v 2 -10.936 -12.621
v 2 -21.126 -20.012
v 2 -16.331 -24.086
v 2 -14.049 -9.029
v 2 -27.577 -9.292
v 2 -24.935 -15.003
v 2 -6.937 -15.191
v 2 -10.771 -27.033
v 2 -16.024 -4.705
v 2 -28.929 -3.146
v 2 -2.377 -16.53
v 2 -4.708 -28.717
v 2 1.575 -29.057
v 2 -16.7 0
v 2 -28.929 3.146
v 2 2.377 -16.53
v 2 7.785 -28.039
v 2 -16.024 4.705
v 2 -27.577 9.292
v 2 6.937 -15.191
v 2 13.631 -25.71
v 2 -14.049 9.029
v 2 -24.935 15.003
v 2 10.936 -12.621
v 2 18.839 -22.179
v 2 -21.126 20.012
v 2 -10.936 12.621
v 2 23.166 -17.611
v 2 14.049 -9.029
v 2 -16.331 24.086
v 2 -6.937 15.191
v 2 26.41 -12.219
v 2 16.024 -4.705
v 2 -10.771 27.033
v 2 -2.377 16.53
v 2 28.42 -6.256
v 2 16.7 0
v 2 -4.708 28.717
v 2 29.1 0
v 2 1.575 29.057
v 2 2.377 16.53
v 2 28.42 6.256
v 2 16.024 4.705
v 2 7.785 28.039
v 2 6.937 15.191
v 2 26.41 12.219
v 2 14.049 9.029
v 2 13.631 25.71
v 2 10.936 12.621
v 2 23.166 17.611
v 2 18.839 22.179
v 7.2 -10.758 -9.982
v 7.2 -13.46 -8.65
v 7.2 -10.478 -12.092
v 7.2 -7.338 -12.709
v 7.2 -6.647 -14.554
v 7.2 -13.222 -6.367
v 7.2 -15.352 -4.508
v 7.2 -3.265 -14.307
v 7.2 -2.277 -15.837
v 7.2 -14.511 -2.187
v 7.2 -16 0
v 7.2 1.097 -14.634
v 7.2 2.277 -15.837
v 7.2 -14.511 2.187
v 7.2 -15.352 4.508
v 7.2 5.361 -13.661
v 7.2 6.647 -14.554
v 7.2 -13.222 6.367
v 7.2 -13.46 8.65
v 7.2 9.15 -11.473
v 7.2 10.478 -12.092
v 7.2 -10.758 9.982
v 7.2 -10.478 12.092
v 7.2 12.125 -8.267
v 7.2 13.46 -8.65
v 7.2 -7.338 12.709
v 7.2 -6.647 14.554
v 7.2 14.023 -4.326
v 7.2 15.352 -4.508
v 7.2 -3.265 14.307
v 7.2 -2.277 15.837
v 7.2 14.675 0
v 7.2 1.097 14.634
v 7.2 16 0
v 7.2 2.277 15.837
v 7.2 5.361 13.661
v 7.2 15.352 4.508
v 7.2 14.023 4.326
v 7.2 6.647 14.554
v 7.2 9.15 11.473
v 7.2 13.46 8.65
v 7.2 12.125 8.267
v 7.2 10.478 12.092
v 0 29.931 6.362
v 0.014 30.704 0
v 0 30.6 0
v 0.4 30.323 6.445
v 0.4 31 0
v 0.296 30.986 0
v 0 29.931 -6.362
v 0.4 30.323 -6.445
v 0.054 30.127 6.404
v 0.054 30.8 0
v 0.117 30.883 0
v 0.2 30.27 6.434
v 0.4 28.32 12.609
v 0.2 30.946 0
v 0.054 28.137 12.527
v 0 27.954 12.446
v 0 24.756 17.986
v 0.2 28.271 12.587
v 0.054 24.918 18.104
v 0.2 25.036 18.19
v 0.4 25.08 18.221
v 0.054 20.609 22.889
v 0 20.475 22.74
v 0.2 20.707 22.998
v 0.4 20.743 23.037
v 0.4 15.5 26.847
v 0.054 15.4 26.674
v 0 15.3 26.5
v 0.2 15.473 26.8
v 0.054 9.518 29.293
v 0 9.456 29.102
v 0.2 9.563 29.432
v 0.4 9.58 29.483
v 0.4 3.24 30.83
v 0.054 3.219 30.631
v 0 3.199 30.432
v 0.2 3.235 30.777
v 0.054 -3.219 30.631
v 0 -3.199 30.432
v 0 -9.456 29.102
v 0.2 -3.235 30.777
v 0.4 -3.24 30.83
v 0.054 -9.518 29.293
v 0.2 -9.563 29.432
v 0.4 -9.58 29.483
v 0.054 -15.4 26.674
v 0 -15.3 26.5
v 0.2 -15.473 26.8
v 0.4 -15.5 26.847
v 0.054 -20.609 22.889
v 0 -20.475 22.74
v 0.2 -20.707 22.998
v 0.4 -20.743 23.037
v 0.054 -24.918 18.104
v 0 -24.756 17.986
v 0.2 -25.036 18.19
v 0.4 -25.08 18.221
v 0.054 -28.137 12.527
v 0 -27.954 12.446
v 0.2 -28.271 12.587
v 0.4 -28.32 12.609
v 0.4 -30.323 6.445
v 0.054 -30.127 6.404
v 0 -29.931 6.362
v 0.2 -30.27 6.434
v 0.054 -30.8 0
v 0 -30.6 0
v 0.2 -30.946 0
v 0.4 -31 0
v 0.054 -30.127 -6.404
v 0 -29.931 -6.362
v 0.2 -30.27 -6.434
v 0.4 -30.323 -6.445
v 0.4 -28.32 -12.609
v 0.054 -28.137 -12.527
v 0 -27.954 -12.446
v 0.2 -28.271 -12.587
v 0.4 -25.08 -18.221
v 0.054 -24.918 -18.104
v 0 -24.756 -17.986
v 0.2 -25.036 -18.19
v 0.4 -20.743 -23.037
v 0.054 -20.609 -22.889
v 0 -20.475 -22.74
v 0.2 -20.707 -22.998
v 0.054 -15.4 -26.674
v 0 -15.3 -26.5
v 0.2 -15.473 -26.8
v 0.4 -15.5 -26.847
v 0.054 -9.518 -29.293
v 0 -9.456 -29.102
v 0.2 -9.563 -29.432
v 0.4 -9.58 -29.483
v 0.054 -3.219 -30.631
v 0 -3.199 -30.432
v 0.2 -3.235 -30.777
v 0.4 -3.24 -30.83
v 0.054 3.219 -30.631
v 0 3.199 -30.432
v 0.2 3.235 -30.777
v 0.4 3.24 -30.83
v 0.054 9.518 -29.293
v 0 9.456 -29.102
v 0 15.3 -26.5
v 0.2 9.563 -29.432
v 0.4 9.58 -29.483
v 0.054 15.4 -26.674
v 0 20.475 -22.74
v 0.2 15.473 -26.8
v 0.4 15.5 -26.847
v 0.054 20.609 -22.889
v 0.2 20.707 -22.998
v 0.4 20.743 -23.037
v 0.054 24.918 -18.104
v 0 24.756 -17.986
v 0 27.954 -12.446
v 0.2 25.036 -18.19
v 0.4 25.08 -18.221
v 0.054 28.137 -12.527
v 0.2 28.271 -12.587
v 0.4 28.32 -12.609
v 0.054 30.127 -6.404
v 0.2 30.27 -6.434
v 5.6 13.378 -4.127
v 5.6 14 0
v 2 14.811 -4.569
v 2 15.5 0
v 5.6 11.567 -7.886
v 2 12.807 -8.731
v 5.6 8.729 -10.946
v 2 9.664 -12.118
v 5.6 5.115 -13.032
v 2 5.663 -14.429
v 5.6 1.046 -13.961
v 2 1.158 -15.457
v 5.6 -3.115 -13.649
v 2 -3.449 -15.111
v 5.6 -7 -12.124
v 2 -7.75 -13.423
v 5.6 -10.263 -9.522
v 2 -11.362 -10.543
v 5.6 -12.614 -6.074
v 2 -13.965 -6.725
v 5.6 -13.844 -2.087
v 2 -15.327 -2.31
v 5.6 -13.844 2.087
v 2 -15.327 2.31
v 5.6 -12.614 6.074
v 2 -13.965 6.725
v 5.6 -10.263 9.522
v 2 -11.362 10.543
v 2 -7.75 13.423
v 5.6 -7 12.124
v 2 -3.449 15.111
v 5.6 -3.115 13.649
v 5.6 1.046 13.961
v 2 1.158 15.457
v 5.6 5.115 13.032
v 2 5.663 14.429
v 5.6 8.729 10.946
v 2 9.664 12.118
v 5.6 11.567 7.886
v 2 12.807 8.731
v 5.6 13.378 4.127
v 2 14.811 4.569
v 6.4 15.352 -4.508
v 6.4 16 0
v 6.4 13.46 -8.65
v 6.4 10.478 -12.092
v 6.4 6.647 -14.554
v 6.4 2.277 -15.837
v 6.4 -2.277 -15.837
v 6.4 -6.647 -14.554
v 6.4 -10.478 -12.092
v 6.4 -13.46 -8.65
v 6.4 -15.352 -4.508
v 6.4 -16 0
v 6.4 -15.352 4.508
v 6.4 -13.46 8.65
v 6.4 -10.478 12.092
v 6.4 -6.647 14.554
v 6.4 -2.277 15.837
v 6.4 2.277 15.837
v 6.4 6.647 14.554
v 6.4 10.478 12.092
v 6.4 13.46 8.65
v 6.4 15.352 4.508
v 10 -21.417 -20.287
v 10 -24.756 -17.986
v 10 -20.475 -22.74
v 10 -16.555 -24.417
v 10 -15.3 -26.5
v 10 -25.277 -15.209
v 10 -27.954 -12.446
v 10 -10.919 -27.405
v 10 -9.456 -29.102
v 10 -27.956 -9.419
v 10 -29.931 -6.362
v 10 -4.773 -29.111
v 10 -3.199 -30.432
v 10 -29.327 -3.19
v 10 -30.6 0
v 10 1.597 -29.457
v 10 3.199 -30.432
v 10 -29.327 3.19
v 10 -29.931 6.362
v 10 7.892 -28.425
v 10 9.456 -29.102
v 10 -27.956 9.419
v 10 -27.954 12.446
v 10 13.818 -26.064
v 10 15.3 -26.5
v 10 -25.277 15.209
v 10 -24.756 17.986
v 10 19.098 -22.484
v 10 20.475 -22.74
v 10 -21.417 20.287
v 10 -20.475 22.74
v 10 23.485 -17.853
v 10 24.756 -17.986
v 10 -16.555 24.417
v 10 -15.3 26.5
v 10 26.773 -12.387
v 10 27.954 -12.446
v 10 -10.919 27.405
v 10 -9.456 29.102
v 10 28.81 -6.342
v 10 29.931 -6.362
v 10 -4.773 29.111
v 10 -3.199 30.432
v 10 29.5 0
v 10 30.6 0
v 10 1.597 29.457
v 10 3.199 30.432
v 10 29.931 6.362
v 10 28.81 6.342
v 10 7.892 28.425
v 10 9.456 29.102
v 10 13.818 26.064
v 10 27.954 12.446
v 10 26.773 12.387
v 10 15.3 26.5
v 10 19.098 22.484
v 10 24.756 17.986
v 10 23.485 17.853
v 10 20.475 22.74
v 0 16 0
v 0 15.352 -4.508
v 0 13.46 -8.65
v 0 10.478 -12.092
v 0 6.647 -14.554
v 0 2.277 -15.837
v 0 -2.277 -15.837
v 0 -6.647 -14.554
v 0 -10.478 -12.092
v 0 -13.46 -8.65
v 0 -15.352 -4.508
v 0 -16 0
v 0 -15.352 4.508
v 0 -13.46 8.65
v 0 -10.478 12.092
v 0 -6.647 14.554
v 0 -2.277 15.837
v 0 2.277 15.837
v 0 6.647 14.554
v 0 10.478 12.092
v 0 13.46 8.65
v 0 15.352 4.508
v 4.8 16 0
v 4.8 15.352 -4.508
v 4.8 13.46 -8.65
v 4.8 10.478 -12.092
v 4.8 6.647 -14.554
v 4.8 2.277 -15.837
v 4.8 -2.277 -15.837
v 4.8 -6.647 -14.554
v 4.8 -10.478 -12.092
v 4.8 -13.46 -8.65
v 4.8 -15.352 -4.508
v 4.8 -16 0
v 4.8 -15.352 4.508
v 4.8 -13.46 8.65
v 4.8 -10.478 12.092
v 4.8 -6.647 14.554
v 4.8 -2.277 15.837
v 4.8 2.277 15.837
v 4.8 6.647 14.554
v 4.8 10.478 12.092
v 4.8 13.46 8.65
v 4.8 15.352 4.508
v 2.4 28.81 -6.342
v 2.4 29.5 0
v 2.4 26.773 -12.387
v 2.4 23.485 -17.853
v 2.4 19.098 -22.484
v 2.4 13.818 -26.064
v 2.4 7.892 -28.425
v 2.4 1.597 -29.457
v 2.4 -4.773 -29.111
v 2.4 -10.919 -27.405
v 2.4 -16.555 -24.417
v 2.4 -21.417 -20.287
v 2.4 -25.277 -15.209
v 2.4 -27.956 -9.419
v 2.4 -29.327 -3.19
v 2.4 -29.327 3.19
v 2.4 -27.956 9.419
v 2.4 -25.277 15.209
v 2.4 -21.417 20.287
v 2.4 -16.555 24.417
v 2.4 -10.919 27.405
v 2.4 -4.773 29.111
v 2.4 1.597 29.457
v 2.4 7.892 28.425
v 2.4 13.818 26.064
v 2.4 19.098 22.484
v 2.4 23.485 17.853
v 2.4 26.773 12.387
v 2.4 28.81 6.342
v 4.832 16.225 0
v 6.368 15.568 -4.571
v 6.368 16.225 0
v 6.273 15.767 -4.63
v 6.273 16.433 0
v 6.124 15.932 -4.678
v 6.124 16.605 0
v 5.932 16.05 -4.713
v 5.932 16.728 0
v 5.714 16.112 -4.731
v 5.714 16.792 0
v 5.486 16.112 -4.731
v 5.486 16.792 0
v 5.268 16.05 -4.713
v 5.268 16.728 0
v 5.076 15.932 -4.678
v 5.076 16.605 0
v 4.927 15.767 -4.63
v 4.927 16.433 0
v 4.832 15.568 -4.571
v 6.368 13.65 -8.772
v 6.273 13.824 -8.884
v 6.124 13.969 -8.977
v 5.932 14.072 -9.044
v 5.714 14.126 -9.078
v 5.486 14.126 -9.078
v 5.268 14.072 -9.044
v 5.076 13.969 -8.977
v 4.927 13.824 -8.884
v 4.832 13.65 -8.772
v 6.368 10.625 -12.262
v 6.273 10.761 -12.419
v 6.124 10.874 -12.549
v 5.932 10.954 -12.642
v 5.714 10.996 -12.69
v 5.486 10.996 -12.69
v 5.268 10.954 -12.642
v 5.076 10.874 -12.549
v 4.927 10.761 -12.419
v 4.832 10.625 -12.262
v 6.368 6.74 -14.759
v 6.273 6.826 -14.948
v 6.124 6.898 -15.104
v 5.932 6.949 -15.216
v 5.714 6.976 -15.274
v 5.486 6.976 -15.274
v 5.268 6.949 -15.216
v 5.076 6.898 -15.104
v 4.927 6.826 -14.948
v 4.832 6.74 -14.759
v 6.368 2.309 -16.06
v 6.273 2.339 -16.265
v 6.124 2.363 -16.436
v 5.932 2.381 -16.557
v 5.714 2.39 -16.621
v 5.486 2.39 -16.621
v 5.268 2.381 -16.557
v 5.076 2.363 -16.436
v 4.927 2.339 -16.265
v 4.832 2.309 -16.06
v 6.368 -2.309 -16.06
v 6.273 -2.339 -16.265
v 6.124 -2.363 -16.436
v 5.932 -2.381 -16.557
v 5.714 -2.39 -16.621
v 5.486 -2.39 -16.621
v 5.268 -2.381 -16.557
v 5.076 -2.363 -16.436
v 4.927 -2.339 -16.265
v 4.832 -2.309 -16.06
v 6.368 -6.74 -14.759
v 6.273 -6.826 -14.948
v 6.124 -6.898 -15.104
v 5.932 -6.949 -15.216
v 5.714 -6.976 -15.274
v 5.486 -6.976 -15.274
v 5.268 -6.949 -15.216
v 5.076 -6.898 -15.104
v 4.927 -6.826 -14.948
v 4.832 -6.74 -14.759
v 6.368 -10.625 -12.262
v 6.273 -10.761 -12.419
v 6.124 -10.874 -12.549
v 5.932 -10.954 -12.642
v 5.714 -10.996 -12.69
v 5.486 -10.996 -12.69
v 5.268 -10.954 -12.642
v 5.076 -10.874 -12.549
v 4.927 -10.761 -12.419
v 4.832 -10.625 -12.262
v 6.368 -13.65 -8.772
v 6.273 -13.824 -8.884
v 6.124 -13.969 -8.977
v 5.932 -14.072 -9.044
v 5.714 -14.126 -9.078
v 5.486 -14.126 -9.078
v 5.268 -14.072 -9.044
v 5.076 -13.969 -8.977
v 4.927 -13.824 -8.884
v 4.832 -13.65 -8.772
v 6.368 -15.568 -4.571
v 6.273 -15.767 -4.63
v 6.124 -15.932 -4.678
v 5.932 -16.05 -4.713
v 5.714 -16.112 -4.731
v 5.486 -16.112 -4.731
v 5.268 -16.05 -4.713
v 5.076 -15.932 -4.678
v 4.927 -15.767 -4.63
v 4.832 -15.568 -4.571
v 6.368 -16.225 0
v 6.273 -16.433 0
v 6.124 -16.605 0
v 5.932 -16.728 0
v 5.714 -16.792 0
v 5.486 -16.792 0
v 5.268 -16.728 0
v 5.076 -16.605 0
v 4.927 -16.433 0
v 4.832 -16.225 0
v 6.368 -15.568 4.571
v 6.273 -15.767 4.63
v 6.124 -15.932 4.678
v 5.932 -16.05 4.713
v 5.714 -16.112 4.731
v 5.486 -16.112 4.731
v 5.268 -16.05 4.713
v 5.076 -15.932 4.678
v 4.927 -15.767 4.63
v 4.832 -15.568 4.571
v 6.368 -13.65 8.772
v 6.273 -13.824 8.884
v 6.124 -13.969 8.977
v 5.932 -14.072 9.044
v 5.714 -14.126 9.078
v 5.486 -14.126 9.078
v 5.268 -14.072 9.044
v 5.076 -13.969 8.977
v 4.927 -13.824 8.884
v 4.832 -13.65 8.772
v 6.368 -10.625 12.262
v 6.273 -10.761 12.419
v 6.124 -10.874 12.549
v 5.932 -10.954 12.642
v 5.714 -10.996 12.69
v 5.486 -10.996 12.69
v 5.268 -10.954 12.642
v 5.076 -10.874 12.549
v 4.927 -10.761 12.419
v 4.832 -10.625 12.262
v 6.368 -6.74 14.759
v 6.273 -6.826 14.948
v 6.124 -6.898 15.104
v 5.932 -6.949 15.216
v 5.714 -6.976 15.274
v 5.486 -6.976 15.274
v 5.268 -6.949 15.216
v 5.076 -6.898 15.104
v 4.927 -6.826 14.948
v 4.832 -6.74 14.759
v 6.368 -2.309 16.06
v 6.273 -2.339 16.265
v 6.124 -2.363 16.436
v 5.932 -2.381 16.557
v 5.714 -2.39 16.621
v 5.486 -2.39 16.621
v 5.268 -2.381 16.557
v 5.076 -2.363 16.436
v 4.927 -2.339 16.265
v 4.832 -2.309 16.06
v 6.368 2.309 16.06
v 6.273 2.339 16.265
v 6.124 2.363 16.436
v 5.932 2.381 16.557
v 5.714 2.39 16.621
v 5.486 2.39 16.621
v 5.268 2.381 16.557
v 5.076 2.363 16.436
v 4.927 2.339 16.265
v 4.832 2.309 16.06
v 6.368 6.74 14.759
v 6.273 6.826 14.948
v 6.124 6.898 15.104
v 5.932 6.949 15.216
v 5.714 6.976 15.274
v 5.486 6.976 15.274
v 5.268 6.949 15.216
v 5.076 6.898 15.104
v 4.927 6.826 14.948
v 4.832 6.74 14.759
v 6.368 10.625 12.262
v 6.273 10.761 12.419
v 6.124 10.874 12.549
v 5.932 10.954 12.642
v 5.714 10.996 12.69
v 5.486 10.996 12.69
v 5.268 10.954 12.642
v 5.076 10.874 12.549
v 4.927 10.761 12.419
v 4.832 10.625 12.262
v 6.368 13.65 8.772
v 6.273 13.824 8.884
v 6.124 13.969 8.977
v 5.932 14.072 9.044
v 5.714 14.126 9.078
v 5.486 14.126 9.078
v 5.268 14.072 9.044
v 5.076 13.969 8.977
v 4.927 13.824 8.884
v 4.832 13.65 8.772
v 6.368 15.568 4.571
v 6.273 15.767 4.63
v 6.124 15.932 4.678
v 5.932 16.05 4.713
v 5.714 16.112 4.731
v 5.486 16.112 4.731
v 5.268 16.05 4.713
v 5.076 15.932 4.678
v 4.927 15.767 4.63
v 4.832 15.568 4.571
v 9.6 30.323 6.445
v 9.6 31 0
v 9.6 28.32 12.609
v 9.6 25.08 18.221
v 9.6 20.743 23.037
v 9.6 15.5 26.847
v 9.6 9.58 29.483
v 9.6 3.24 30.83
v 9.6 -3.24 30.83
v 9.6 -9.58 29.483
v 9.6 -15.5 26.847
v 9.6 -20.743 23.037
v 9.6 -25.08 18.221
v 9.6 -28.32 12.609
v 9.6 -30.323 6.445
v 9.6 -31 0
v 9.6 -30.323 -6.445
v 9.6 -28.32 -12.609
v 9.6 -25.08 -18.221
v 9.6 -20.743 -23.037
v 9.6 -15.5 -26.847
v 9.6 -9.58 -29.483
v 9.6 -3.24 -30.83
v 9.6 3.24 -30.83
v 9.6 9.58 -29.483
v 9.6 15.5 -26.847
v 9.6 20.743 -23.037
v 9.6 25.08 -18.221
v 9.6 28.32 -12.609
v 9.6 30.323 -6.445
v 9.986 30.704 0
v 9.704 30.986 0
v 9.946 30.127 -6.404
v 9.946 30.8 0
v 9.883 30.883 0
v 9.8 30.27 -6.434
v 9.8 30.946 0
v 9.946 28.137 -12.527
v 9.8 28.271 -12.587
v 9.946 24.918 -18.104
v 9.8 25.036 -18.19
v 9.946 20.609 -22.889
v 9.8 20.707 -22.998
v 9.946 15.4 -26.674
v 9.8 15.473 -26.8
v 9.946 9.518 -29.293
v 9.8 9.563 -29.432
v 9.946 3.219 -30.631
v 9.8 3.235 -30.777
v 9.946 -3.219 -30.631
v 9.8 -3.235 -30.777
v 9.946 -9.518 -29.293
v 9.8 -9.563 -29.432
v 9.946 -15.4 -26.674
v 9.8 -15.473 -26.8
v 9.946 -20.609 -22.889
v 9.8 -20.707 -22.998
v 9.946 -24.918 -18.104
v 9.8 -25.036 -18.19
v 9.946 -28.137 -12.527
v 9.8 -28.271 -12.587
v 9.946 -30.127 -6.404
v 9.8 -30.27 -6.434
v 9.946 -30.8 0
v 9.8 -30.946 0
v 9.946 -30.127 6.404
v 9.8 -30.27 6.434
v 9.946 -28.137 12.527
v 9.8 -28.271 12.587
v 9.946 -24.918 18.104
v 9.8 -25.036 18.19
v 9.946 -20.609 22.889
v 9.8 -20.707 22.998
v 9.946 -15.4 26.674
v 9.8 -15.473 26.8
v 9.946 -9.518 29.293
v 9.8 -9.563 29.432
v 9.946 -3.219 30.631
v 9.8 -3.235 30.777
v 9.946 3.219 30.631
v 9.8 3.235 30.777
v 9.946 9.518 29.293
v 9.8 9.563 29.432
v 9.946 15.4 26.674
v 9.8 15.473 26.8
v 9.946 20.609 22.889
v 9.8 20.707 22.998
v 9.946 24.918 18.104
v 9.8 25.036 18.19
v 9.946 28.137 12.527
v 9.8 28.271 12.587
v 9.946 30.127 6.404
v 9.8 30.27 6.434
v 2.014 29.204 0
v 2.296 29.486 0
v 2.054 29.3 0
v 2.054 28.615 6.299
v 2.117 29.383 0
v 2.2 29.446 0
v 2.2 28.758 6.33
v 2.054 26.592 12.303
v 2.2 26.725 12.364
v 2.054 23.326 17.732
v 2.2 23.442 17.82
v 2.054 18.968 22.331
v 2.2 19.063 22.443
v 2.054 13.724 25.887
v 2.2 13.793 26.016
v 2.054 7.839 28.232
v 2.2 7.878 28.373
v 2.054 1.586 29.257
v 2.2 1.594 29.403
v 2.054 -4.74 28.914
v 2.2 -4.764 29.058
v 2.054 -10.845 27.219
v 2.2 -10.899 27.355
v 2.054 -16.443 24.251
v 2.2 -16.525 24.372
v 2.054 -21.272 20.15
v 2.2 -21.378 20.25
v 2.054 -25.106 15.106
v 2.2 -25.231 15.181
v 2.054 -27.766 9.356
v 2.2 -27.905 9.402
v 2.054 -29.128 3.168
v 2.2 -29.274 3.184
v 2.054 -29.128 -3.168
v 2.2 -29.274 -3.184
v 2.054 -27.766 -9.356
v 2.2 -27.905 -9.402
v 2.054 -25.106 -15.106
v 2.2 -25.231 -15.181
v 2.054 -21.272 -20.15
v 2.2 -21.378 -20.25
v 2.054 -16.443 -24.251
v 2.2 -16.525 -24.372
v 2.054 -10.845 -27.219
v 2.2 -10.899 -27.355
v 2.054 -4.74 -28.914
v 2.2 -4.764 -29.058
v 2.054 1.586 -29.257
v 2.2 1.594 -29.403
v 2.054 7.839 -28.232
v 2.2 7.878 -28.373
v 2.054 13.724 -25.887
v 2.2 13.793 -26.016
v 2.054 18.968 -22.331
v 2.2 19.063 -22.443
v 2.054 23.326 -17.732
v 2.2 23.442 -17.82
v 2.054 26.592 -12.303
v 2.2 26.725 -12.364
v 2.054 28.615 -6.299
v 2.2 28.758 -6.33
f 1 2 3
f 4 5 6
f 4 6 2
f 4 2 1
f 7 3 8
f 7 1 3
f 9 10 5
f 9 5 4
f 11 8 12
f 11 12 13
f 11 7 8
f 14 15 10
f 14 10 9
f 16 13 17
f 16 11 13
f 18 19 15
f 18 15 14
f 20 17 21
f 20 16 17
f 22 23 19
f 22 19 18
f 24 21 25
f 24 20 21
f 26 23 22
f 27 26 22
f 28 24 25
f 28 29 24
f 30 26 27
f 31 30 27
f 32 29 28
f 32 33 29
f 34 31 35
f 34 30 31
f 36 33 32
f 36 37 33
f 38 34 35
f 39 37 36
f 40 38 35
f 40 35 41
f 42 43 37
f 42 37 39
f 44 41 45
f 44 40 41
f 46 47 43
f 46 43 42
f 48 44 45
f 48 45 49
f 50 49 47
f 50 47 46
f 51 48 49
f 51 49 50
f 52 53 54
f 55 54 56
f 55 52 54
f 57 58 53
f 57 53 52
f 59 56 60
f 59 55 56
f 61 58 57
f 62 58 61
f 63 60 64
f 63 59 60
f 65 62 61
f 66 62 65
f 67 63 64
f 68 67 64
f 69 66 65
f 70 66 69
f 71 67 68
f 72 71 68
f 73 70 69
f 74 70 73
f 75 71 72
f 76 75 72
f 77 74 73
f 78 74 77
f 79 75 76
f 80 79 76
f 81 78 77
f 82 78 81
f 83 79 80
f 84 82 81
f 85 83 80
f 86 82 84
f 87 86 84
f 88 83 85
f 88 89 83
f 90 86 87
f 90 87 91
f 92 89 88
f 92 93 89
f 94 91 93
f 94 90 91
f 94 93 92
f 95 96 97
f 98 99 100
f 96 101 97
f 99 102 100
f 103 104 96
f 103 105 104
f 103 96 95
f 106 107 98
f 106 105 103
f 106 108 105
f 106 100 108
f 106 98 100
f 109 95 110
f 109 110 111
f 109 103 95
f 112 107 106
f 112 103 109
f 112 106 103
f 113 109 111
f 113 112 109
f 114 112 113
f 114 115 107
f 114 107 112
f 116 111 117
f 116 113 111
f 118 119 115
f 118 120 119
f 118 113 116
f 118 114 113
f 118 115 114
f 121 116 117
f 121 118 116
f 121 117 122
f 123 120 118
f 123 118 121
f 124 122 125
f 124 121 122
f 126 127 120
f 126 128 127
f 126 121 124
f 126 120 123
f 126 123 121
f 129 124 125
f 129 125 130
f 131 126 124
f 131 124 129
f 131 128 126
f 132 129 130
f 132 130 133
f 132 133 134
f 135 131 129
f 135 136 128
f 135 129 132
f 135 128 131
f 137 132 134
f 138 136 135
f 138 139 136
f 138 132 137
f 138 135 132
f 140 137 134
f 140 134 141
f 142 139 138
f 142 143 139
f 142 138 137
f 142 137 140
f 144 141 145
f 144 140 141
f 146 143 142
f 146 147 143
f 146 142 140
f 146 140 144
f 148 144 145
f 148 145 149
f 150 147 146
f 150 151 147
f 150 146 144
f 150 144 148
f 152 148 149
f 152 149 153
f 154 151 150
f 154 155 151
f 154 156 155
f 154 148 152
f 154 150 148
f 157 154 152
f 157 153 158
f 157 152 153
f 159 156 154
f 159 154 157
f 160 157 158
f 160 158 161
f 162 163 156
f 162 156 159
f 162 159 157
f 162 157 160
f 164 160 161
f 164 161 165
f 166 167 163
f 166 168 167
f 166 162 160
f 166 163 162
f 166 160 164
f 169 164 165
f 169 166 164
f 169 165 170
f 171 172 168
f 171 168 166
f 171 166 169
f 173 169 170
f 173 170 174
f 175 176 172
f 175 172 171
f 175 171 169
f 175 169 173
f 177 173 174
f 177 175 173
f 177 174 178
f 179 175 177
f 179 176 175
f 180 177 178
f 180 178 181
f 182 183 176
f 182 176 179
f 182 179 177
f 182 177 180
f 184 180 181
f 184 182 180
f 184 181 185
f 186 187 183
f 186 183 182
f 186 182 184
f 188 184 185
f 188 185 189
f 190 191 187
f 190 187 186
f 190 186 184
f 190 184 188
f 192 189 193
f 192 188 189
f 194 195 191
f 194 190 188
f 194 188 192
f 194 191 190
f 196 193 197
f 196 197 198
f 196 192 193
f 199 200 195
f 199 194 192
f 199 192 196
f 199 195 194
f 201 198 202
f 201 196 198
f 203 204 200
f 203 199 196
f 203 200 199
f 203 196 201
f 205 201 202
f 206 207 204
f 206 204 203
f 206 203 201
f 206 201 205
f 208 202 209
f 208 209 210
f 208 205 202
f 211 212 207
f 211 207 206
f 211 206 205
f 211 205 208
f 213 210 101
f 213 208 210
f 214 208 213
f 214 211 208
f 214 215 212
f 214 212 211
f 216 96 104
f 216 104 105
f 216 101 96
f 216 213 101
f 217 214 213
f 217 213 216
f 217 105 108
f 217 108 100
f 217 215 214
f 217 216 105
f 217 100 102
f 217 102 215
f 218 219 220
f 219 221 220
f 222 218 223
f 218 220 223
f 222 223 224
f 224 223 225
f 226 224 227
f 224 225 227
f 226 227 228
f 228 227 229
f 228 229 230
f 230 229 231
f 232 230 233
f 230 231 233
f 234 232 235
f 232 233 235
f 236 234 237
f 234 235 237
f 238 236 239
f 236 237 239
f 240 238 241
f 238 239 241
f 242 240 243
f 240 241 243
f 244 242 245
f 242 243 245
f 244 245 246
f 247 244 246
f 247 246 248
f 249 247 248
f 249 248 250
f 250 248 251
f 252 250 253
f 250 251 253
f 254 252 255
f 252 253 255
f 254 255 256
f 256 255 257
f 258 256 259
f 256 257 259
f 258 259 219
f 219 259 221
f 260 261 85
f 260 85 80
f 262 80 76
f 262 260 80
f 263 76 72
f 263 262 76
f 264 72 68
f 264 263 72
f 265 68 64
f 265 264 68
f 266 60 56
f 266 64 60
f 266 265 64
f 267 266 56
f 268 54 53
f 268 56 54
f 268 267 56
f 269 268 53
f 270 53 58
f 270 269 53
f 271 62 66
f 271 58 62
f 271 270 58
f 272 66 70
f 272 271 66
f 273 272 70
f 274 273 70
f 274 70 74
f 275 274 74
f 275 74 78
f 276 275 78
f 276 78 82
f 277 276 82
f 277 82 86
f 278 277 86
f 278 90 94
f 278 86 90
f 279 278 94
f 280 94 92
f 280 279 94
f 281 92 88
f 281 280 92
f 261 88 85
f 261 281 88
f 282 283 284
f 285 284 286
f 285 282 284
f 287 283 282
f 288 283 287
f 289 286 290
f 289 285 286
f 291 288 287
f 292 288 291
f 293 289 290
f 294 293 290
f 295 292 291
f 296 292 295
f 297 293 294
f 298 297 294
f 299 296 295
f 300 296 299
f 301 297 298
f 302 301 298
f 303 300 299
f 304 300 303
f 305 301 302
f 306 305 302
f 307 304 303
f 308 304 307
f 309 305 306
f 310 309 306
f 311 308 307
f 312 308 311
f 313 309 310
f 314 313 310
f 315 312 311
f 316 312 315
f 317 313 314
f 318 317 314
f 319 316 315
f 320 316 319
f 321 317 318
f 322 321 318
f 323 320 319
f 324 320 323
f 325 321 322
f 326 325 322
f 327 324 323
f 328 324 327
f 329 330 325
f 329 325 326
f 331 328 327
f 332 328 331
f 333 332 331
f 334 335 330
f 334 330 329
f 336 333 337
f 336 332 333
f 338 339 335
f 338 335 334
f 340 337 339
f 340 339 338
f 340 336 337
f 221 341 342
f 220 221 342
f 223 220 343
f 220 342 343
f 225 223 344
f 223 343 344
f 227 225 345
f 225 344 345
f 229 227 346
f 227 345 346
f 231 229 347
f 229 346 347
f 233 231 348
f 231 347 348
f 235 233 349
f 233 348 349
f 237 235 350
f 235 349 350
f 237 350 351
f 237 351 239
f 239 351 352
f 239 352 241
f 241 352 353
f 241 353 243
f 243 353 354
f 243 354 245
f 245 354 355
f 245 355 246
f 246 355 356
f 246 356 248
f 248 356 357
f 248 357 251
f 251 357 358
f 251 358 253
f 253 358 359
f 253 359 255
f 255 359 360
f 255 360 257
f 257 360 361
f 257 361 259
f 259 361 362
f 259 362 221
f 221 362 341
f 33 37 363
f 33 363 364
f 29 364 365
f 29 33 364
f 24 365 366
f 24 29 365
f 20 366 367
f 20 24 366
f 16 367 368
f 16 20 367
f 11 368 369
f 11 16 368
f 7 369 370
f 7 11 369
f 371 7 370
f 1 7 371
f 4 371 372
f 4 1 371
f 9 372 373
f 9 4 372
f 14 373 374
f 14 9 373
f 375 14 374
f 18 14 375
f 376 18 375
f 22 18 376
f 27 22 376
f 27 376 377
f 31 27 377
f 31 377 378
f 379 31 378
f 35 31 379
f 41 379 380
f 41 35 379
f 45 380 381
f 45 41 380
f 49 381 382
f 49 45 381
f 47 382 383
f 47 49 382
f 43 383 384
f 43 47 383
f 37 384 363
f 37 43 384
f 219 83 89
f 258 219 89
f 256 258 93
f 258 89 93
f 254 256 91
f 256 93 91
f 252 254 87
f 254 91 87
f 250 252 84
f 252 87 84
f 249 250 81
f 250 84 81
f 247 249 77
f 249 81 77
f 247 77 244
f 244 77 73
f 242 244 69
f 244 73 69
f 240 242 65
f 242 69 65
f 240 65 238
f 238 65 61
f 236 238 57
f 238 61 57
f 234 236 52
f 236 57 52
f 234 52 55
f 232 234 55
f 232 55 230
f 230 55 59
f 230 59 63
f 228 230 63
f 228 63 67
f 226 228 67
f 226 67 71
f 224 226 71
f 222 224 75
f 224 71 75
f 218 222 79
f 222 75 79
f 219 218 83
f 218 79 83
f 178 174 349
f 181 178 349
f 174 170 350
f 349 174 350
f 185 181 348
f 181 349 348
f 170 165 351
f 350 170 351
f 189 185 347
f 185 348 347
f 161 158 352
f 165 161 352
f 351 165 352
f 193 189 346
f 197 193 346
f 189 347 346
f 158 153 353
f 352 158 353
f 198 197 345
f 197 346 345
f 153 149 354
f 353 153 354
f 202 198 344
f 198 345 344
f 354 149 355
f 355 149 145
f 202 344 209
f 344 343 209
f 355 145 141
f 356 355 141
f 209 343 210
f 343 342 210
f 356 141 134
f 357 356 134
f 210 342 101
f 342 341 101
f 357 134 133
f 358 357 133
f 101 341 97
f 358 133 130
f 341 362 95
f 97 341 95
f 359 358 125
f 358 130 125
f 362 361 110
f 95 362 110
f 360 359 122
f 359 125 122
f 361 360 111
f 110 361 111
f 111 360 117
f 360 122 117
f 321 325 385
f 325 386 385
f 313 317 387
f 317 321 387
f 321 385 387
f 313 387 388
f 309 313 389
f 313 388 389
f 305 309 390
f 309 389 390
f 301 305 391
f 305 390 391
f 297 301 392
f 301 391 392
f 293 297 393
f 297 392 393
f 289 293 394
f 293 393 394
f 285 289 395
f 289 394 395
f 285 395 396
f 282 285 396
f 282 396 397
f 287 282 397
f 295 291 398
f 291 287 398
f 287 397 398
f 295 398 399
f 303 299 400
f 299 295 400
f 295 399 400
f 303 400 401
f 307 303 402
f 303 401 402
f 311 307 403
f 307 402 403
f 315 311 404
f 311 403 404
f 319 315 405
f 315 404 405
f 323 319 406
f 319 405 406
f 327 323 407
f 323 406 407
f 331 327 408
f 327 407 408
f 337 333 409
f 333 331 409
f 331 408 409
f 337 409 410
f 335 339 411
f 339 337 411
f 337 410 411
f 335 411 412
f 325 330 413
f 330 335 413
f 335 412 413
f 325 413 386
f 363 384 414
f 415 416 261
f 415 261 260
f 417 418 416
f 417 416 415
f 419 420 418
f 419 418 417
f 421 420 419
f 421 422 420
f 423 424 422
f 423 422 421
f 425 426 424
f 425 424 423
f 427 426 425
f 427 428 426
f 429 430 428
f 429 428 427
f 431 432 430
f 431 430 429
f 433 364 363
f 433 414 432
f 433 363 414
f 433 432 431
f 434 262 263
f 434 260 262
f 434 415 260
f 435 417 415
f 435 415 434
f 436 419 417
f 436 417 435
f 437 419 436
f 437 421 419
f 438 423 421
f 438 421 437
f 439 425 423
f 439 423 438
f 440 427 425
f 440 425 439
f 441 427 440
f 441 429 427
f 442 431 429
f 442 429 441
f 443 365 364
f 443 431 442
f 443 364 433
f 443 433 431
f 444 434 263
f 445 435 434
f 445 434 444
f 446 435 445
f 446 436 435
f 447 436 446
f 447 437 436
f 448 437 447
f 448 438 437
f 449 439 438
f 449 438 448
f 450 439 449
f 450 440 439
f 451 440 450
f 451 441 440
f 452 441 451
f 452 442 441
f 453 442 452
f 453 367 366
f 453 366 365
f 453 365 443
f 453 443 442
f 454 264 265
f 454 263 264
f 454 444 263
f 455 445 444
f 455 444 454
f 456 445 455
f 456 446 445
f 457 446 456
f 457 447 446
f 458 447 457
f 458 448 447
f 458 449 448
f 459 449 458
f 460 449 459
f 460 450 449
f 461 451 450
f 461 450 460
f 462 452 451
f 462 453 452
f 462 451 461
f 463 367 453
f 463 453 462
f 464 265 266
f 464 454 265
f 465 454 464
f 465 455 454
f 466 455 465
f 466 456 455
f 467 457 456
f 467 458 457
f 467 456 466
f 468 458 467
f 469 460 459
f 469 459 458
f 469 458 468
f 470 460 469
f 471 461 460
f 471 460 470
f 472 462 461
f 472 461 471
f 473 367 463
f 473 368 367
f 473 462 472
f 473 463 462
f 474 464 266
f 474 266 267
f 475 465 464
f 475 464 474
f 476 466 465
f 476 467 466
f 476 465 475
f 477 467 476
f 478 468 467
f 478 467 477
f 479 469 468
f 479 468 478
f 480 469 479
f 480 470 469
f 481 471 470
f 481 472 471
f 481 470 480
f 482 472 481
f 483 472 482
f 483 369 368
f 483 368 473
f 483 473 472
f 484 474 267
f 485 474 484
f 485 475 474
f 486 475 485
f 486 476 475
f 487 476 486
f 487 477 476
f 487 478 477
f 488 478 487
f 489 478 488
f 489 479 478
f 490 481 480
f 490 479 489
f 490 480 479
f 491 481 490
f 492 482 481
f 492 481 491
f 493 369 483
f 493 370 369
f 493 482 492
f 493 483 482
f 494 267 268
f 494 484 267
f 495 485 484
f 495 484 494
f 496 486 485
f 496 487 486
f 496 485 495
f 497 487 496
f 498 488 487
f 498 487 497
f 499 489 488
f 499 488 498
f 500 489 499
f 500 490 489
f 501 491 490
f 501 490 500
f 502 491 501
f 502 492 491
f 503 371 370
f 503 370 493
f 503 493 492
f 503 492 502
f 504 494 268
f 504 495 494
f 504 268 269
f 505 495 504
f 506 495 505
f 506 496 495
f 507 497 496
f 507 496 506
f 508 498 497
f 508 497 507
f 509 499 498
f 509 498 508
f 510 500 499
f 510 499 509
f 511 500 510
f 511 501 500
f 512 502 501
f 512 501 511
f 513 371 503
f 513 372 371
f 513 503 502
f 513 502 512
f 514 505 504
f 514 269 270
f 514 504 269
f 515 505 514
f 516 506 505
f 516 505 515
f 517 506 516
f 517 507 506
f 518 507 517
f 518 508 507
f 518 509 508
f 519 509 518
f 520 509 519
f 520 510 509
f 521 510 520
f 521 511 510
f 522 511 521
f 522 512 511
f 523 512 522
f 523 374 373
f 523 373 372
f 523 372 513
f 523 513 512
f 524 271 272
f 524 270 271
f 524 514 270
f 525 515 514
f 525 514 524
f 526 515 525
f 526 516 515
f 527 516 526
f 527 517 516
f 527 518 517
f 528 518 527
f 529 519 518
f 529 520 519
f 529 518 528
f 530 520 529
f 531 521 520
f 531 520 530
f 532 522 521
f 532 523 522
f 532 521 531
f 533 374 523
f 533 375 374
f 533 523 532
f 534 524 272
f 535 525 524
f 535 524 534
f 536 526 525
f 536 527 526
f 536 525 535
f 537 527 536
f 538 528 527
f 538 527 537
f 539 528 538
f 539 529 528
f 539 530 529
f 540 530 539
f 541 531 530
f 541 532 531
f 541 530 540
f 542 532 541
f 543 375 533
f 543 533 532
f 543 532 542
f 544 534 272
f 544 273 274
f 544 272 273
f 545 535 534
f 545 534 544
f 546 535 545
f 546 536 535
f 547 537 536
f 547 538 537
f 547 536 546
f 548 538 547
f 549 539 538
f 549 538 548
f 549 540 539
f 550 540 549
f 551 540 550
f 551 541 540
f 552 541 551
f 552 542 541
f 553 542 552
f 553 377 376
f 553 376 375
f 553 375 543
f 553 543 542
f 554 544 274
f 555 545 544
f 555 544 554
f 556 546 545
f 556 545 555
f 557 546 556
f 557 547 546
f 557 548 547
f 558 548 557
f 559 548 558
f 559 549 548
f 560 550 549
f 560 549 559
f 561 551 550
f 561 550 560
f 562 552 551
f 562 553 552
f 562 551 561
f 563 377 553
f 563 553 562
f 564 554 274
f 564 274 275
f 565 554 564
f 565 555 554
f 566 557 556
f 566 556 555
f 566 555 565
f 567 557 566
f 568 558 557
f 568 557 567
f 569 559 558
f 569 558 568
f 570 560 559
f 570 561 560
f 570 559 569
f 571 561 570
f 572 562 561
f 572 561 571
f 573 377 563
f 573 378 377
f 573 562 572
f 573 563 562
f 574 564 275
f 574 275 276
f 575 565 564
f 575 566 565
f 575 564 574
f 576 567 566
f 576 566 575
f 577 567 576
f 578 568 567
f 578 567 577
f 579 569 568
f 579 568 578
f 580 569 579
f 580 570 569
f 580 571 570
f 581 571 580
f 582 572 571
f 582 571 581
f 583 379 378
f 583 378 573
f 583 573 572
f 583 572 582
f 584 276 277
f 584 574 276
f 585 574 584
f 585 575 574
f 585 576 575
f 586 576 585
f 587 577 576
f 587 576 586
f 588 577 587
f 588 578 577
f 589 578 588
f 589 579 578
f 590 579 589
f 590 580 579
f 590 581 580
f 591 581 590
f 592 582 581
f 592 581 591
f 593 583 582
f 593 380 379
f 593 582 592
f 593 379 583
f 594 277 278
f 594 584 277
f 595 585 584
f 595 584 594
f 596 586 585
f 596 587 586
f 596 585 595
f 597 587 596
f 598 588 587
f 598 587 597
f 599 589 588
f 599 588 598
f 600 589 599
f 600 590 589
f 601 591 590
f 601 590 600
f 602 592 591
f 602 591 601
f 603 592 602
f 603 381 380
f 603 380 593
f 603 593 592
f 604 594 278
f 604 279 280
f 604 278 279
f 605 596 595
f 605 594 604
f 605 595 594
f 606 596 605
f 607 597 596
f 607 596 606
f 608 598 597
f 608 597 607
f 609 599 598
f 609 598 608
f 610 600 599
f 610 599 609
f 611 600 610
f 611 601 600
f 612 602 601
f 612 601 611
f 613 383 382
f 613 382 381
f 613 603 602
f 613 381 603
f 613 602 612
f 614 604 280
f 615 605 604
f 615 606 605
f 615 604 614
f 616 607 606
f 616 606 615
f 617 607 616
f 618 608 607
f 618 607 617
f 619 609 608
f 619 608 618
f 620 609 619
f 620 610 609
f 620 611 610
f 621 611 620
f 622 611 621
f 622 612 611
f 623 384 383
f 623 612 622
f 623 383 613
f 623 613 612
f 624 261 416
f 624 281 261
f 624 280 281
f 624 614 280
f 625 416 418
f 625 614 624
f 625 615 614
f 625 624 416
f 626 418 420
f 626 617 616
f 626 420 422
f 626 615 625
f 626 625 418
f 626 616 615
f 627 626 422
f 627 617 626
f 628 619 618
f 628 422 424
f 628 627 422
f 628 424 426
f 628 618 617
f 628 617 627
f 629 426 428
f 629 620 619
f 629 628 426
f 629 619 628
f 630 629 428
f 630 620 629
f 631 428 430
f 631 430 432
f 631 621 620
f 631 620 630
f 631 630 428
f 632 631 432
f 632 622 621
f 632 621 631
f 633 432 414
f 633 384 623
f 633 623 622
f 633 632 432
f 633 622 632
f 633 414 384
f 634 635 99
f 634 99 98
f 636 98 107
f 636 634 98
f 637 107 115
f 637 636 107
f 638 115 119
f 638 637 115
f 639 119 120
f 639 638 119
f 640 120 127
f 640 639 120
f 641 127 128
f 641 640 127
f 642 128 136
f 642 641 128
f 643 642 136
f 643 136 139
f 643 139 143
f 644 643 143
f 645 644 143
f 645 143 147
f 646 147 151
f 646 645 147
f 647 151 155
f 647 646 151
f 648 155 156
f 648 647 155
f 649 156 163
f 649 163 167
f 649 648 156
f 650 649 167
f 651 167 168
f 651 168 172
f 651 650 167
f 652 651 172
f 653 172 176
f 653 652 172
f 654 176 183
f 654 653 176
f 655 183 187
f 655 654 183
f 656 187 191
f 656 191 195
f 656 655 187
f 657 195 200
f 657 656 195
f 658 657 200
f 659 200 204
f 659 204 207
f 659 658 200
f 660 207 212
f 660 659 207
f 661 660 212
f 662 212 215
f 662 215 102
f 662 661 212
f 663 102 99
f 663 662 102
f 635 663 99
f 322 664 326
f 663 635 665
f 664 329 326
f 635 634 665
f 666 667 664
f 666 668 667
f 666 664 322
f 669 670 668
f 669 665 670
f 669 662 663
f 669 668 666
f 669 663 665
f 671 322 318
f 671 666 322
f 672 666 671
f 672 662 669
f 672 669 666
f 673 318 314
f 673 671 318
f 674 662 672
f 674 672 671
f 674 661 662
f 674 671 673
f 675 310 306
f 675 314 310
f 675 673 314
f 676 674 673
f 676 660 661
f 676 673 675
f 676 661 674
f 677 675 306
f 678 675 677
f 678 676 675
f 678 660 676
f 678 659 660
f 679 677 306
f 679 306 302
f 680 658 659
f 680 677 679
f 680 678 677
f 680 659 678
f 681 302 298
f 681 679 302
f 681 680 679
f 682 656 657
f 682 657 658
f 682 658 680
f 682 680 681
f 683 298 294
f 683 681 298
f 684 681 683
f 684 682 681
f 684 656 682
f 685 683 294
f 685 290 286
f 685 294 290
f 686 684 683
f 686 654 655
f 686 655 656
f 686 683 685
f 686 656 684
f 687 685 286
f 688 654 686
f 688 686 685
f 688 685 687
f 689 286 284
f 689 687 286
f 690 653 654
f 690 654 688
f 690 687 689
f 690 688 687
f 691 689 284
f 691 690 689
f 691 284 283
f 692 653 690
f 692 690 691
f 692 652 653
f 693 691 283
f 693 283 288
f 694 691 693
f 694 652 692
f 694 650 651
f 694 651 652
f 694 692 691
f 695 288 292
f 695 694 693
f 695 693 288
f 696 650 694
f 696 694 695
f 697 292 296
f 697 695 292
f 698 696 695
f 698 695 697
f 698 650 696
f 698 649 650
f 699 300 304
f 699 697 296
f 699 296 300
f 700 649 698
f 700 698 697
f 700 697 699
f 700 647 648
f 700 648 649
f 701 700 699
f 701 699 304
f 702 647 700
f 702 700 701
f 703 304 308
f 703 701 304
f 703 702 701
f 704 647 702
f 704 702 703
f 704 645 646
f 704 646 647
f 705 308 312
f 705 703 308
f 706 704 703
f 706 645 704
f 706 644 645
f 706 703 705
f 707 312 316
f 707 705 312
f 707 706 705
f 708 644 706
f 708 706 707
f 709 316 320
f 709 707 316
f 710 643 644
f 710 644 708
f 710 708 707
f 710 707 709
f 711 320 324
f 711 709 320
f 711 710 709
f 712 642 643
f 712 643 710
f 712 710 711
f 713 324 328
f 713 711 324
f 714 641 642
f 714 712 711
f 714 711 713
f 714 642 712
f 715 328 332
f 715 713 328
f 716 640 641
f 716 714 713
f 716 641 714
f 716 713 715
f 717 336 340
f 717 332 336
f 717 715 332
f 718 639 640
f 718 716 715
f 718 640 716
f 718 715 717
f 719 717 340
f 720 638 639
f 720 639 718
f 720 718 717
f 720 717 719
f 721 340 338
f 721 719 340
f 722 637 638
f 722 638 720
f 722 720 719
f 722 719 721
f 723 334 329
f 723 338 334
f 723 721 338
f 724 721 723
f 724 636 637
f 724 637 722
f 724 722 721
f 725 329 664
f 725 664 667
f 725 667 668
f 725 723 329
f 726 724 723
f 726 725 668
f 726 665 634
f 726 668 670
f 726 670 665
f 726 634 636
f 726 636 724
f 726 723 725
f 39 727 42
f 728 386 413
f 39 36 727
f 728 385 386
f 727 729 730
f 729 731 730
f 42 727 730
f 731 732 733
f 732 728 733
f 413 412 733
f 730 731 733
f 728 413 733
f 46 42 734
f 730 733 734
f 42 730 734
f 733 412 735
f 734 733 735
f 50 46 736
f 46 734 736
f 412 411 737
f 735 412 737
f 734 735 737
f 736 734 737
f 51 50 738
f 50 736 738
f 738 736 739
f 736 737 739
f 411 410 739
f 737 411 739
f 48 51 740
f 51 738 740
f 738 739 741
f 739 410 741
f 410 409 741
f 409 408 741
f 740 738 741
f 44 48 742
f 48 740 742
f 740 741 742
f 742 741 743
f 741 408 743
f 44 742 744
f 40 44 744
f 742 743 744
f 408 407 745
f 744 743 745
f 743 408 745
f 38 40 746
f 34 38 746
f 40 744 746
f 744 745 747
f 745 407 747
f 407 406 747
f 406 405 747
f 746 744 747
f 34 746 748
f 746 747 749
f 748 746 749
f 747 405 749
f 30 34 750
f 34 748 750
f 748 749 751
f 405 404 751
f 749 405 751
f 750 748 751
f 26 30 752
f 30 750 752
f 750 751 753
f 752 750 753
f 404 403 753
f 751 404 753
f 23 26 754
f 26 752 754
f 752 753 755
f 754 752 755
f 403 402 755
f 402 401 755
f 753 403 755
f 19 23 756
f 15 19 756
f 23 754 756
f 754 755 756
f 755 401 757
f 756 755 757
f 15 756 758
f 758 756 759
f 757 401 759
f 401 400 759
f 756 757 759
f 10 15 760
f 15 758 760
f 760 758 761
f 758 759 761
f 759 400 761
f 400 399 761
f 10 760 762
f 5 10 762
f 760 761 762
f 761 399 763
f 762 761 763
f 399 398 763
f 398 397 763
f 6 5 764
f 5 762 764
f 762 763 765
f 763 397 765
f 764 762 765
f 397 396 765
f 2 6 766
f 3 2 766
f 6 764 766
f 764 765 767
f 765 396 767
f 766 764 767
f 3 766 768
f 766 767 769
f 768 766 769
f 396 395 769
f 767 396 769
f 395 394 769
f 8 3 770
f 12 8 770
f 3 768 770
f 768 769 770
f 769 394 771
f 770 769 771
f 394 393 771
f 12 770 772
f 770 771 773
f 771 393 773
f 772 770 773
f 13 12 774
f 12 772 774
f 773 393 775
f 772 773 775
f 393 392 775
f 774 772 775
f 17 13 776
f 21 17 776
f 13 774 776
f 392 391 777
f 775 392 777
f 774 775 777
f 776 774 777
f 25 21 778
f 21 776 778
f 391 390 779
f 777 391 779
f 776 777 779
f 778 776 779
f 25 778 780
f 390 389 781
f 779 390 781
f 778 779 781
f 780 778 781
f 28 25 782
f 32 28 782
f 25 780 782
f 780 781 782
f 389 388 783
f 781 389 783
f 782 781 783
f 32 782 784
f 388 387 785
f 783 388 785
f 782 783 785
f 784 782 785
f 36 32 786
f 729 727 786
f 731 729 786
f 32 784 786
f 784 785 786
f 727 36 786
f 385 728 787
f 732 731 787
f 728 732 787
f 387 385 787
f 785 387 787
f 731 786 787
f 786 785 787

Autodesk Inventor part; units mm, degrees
ref_plane "YZ Plane" through (0, 0, 0) normal (1, 0, 0) x (0, 1, 0)
ref_plane "XZ Plane" through (0, 0, 0) normal (0, 1, 0) x (-1, 0, 0)
ref_plane "XY Plane" through (0, 0, 0) normal (0, 0, 1) x (1, 0, 0)
sketch "Эскиз1" plane through (0, 0, 0) normal (0, 0, 1) x (1, 0, 0)
  circle A0 centre (5.6, 16) radius 0.52
  circle A1 centre (5.6, 16) radius 0.8
  line L0 (7.2, 14.675) -> (7.2, 16)
  line L1 (0, 31) -> (10, 31)
  line L2 (10, 31) -> (10, 29.5)
  line L3 (10, 29.5) -> (2, 29.5)
  line L4 (0, 0) -> (9.5856, 0)
  line L5 (0, 31) -> (0, 16)
  line L6 (0, 16) -> (2, 15.5)
  line L7 (2, 15.5) -> (5.6, 14)
  line L8 (5.6, 14) -> (7.2, 14.675)
  line L9 (5.6, 14) -> (0, 14) construction
  line L10 (0, 37.2) -> (0, -6.2) projected
  line L11 (-2, 0) -> (12, 0) projected
  line L12 (4.8, 16) -> (2, 16.7)
  line L13 (2, 16.7) -> (2, 29.5)
  line L14 (7.2, 16) -> (6.4, 16)
  dimension "d0" = 62
  dimension "d1" = 29.35
  dimension "d2" = 1.5
  dimension "d3" = 1.04
  dimension "d4" = 1.6
  dimension "d5" = 28
  dimension "d6" = 31
  dimension "d7" = 32
  dimension "d8" = 5.6
  dimension "d9" = 7.2
  dimension "d10" = 10
  dimension "d12" = 2
revolve "Базовый элемент" add sketch "Эскиз1" angle 360 about axis through (0, 0, 0) along (1, 0, 0) contours L14 L0 L8 L7 L6 L5 L1 L2 L3 L13 L12 A1
revolve "Пружинные1" add sketch "Эскиз1" angle 360 about axis through (0, 0, 0) along (1, 0, 0) contours A0 | A1
fillet "Сопряжение1" radius 0.4 3 edges at (10, -31, 0) (2, -29.5, 0) (0, -31, 0)
equation "\"d3\" = SPDI"
equation "\"d4\" = SPDA"
equation "\"d8\" = SPDST"
equation "\"d9\" = SDI"
equation "\"d12\" = SD"
equation "\"d11\" = RR"
equation "\"SD2\" = 62"
equation "\"SWDT\" = 8"
equation "\"RR\" = 0.4"
equation "\"SD\" = 2"
equation "\"NND\" = 42"
equation "\"SPDA\" = 1.6"
equation "\"SPDI\" = 1.04"
equation "\"TKDM\" = 46"
equation "\"HLDM\" = 46.8"
equation "\"ABDM\" = 44"
equation "\"SDI\" = 7.2"
equation "\"SPDST\" = 5.6"
equation "\"LAB\" = 0.4"
properties part number "Манжет 1-42x62x8 ГОСТ 8752-79" material "Резина"
